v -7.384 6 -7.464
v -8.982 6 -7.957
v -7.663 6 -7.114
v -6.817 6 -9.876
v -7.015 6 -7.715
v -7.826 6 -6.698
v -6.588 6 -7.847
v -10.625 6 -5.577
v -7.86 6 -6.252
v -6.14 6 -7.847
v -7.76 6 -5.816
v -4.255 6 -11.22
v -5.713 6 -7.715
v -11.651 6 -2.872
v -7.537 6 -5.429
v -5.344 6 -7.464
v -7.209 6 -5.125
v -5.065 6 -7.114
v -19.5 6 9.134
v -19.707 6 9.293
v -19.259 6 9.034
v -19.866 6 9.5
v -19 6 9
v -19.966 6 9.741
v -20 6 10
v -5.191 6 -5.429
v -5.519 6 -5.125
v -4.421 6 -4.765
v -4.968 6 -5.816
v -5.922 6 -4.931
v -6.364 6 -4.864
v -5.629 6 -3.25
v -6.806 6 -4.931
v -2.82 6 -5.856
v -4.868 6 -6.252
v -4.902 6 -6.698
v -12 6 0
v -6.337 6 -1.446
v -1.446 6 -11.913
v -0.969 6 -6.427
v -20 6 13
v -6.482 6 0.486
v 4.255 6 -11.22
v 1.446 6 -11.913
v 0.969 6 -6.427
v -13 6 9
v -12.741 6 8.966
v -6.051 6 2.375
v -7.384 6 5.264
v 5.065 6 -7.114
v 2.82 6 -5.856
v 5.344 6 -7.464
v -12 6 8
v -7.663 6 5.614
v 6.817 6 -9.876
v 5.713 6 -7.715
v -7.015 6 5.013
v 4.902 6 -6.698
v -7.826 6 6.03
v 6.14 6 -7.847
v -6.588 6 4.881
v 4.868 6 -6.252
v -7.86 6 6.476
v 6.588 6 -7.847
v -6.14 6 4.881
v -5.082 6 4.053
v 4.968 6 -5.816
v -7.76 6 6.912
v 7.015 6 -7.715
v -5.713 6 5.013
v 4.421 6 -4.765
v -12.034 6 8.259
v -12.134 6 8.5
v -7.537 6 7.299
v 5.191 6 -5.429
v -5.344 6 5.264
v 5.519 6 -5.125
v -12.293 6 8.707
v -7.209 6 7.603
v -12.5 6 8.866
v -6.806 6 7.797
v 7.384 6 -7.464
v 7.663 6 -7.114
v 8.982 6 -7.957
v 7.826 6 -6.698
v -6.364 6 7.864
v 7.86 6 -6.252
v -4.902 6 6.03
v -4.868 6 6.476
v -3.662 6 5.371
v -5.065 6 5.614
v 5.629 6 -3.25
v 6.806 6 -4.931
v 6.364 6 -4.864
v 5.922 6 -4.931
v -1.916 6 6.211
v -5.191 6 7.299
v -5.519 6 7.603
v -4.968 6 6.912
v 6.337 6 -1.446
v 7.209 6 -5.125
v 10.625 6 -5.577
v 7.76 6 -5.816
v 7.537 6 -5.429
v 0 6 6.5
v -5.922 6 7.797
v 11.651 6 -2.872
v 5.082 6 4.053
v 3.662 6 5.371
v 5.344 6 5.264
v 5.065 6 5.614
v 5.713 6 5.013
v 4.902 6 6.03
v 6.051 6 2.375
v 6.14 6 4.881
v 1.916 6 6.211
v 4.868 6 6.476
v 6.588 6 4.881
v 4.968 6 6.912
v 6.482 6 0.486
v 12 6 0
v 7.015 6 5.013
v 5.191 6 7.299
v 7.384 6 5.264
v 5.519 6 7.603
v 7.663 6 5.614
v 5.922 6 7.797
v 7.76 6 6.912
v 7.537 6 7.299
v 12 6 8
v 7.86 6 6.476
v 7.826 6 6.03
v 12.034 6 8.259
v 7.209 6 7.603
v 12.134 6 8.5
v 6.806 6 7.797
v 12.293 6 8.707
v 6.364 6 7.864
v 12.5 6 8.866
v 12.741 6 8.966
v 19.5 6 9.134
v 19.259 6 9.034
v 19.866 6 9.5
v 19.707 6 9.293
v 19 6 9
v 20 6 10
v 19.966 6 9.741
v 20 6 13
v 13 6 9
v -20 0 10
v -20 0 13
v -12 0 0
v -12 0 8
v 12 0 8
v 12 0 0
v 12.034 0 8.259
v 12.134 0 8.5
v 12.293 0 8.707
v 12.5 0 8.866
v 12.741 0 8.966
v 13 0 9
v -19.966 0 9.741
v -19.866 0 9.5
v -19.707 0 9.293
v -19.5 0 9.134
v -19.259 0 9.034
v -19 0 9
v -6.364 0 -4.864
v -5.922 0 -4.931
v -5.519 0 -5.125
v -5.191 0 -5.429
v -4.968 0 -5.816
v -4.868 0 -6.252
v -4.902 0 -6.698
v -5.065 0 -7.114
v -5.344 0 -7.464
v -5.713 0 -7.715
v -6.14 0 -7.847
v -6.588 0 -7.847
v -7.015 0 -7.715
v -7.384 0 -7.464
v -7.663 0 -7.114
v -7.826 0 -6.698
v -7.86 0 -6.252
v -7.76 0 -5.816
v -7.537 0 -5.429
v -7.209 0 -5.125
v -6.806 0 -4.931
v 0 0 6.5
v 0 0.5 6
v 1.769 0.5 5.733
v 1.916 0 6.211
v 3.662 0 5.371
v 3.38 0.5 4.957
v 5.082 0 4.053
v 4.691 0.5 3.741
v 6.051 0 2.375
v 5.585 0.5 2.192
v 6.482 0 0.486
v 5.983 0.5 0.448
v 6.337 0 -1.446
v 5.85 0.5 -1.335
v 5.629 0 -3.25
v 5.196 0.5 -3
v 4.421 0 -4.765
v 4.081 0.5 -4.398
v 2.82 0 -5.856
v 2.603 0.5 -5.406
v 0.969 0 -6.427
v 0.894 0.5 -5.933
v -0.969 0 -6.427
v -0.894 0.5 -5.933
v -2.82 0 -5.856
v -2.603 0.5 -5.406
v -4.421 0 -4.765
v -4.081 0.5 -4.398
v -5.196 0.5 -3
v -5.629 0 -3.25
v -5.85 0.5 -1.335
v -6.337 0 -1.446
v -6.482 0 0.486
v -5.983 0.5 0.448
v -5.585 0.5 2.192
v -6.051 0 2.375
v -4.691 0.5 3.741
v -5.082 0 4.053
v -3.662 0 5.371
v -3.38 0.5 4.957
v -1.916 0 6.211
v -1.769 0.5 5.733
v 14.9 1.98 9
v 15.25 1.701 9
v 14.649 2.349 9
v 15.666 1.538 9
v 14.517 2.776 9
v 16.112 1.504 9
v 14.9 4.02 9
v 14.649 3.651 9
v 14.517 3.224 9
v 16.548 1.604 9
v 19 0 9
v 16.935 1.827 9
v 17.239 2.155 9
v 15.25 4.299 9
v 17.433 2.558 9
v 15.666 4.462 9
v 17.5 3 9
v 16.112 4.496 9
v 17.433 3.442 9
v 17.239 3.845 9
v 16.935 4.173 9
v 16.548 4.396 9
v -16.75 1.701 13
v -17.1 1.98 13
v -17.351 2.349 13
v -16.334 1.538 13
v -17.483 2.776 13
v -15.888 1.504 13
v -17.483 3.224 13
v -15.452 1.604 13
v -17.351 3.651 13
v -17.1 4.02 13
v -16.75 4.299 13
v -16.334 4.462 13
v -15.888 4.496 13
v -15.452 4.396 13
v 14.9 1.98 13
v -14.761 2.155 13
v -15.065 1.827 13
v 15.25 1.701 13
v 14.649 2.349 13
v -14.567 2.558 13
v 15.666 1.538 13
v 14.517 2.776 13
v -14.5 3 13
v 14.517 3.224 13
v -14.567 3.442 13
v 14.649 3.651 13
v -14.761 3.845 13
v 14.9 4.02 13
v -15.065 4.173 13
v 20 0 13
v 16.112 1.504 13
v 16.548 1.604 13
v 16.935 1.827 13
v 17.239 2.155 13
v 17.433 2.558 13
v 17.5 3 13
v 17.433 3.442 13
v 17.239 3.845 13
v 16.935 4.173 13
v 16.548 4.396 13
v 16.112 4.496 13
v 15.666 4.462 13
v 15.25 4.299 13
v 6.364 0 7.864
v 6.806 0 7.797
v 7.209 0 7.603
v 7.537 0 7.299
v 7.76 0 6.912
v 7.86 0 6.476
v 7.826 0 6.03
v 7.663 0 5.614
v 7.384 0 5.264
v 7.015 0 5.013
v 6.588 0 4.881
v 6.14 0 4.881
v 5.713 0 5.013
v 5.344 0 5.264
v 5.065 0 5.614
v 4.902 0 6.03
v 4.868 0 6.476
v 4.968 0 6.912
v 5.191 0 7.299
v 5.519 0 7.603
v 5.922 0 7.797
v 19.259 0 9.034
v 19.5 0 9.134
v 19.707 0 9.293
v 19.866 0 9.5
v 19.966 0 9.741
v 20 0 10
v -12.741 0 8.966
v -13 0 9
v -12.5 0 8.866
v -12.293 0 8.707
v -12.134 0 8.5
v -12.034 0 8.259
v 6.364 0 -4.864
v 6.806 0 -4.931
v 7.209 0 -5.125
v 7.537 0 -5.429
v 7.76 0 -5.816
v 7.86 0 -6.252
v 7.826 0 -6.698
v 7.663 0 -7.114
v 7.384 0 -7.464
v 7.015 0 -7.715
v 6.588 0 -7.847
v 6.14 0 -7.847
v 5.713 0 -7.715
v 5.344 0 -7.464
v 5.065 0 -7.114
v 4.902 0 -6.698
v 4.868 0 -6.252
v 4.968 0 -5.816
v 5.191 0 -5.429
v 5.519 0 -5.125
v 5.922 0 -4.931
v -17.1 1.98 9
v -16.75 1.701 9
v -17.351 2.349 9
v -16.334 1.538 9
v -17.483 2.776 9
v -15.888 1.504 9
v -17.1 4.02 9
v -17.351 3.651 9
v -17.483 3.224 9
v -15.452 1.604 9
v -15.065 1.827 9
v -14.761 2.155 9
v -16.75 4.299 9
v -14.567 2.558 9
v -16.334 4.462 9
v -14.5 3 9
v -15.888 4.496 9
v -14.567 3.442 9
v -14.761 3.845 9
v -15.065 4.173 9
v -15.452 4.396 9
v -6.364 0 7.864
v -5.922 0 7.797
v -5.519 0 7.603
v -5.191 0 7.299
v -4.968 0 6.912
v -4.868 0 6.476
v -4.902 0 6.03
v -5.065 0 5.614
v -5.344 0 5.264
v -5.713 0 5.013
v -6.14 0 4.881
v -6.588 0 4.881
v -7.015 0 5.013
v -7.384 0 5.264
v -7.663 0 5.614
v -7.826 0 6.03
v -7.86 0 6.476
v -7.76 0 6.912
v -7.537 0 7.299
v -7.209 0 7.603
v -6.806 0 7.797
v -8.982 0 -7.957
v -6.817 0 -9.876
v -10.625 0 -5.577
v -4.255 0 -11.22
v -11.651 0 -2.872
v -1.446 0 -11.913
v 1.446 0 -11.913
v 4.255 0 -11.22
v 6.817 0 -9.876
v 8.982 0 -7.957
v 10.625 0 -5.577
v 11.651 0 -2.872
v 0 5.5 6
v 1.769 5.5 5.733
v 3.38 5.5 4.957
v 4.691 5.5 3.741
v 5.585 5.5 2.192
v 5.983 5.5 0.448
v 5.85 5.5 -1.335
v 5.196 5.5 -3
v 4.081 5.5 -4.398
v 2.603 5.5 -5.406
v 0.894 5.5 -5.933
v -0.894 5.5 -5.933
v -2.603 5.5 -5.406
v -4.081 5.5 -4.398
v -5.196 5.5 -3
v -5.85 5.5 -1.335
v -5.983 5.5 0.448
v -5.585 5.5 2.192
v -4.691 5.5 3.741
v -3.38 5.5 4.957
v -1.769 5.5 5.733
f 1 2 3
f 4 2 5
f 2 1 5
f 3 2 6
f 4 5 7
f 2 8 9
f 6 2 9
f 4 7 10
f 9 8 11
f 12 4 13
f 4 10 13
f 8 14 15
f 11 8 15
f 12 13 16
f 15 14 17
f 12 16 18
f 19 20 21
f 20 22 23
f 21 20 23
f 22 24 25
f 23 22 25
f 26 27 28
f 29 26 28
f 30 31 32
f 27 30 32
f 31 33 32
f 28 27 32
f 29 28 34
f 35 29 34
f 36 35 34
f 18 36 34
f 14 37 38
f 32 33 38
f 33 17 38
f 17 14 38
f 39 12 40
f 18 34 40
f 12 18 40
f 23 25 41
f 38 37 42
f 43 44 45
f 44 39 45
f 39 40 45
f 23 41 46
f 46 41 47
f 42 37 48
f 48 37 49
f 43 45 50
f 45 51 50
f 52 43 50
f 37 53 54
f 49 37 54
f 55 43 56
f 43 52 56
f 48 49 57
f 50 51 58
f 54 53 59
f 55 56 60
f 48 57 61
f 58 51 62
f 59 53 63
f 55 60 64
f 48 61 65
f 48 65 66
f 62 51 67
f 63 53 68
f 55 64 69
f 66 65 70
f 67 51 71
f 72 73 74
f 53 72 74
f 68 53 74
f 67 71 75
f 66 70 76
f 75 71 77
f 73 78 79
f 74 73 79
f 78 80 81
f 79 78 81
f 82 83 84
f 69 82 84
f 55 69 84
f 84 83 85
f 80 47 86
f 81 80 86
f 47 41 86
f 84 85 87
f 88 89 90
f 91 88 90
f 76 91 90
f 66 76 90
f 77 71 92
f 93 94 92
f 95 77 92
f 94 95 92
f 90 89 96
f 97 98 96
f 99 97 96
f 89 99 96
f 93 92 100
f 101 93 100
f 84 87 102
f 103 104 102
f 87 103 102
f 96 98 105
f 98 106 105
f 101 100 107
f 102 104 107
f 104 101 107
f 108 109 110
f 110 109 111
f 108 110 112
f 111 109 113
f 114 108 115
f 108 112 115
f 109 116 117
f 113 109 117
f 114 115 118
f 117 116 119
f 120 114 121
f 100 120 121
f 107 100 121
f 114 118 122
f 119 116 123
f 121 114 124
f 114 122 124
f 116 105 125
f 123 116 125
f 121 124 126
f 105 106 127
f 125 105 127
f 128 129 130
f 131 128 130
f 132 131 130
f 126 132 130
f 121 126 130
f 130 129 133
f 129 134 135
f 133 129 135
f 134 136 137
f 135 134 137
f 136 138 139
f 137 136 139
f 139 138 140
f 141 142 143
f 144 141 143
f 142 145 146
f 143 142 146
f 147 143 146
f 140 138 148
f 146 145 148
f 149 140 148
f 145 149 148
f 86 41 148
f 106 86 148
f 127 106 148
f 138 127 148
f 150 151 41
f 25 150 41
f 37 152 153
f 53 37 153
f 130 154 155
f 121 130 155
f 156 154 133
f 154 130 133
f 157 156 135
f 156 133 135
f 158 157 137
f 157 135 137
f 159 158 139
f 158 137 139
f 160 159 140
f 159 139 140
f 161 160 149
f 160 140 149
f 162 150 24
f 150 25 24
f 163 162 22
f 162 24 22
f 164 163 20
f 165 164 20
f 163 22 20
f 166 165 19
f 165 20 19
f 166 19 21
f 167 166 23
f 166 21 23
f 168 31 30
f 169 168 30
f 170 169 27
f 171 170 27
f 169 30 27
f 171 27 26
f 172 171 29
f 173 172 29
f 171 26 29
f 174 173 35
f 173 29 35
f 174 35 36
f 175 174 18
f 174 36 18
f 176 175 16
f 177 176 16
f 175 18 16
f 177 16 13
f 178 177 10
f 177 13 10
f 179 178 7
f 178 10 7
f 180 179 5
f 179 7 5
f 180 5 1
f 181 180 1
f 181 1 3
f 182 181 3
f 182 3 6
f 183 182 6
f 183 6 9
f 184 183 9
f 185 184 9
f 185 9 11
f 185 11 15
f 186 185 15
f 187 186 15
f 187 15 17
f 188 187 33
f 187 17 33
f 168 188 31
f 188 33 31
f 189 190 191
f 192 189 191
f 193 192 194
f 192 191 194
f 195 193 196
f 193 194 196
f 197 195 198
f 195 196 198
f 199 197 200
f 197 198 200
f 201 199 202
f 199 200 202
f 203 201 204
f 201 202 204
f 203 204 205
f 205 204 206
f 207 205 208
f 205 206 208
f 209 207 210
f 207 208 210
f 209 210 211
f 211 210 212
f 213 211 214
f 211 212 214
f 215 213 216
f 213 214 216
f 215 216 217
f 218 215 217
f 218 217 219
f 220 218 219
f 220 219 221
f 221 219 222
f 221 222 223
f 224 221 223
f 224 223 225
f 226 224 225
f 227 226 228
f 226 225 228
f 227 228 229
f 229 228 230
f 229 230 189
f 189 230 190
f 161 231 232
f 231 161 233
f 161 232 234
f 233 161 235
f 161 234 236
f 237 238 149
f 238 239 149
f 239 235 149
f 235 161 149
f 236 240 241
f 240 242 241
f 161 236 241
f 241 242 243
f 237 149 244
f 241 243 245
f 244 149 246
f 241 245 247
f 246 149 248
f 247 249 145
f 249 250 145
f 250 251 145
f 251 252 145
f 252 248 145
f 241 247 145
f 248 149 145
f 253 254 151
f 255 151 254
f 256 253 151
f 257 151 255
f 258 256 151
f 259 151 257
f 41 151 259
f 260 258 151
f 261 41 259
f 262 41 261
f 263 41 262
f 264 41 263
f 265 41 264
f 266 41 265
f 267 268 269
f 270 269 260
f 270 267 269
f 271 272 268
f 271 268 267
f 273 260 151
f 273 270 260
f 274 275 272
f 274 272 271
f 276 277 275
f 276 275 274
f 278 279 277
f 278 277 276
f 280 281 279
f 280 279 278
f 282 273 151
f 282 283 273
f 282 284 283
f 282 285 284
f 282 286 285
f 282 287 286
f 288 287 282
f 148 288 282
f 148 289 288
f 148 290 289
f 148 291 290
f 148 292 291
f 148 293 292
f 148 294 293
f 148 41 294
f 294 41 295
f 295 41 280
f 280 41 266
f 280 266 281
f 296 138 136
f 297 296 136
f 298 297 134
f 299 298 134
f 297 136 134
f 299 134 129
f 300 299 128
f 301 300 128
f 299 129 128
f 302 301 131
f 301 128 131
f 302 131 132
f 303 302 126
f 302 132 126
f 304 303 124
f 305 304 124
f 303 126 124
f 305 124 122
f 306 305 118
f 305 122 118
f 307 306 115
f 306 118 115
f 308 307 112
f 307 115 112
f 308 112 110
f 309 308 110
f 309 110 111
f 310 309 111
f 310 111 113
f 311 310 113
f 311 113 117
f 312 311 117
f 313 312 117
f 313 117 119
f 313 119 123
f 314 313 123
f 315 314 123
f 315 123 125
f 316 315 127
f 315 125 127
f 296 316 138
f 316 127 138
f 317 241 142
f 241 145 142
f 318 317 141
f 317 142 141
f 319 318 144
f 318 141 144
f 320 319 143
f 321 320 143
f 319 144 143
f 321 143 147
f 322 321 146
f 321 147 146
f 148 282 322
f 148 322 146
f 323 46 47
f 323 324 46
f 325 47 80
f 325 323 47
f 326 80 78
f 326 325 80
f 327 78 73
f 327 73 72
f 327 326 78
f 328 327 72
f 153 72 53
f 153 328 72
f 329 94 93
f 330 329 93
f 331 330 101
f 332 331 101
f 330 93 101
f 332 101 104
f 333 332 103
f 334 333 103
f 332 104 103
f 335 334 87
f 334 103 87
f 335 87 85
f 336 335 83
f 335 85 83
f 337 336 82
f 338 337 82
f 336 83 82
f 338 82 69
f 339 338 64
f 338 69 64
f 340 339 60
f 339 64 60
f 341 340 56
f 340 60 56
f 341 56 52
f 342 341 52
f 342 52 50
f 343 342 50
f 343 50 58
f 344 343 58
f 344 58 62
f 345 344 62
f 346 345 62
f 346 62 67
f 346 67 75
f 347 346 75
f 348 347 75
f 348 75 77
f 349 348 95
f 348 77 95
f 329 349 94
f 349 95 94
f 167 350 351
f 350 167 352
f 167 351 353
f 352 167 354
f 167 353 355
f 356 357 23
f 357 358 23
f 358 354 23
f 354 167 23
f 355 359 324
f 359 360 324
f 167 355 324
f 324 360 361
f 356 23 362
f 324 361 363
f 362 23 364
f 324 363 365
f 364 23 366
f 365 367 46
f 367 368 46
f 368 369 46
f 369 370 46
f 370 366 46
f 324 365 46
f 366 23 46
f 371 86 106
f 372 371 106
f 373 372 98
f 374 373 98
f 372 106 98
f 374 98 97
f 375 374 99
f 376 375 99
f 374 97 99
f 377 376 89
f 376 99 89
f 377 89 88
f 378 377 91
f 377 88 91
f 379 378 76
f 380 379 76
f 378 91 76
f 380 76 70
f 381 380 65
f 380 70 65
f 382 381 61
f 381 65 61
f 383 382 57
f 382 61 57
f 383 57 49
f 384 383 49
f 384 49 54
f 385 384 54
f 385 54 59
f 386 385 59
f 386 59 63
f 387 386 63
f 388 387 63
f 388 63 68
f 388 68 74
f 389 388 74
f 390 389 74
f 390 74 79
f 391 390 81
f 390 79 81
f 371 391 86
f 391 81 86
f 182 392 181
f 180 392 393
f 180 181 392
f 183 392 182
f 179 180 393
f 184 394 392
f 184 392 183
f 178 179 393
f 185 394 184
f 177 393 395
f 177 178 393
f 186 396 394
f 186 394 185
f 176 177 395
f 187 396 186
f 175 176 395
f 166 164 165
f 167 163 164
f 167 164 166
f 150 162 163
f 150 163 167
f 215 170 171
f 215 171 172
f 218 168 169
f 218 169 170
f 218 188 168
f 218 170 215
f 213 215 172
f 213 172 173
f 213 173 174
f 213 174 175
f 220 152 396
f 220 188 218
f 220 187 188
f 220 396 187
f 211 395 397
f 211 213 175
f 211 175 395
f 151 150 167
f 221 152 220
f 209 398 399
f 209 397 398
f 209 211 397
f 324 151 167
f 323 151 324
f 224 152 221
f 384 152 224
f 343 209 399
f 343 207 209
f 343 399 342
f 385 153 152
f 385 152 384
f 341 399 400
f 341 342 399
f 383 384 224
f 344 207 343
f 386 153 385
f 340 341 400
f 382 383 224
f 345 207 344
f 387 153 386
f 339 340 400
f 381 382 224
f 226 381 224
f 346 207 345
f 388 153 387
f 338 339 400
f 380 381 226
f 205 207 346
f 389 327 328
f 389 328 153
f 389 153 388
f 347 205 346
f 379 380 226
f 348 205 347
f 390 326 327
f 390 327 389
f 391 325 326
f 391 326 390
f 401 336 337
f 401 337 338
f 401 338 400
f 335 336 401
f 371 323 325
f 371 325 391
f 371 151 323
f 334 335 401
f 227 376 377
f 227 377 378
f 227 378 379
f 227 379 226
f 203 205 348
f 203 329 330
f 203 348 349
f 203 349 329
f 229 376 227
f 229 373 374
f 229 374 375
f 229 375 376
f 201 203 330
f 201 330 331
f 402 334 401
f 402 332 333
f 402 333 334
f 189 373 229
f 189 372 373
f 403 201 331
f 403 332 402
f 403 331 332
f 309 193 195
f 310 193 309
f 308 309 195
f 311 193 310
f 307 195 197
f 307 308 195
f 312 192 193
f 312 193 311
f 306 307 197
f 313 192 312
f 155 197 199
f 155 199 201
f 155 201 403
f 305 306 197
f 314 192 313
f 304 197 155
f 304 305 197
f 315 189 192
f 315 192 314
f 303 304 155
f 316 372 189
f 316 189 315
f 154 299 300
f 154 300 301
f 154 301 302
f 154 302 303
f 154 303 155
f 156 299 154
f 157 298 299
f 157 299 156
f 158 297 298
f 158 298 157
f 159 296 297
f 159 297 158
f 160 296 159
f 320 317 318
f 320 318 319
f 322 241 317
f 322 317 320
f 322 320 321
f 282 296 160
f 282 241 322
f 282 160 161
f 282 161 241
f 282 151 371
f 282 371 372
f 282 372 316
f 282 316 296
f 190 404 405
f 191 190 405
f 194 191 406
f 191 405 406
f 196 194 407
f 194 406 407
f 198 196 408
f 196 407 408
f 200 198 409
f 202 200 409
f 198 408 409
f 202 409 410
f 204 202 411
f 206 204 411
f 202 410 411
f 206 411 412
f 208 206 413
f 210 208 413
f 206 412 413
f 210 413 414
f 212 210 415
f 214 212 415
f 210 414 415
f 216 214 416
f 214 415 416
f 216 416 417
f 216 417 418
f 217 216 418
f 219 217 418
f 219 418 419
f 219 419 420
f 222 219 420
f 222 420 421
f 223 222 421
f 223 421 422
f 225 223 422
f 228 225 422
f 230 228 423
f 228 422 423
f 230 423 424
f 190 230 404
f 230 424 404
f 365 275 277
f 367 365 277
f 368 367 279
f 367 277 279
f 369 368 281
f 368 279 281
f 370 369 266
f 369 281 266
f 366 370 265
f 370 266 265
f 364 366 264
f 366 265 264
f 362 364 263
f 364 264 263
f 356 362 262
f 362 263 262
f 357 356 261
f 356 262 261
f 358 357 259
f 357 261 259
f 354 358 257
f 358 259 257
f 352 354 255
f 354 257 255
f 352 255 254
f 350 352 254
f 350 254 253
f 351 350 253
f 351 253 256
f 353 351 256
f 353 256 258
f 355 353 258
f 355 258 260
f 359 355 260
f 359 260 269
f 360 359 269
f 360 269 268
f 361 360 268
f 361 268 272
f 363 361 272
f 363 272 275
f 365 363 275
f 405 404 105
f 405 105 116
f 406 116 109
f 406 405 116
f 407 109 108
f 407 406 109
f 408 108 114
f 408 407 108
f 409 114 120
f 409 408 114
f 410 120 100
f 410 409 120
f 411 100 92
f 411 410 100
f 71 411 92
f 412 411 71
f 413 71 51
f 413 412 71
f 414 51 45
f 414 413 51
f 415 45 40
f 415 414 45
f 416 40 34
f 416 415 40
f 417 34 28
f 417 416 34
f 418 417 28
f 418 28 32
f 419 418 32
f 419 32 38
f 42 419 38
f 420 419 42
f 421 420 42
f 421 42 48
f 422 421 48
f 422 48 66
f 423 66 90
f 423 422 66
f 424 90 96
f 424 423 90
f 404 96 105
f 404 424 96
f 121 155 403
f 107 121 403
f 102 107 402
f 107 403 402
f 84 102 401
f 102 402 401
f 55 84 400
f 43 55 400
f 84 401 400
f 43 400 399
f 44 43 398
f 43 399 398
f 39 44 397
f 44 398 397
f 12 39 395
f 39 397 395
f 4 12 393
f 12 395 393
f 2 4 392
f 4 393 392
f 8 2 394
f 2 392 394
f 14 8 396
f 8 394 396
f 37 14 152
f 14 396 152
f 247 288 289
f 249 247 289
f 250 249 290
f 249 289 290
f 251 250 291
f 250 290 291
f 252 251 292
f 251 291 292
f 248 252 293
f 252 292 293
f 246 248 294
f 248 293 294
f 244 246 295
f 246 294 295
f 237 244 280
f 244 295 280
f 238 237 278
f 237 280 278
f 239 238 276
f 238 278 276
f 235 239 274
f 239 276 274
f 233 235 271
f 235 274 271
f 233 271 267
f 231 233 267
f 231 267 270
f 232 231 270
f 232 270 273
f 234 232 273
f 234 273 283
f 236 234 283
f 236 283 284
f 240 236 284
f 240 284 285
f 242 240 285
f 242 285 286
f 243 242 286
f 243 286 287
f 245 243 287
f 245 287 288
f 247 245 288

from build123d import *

# Parameters (mm, degrees)
EXTRUDE_1_DEPTH     = 6
SKETCH_2_R          = 6
CUT_EXTRUDE_1_DEPTH = 6
SKETCH_3_R          = 1.5
CUT_EXTRUDE_2_DEPTH = 6
SKETCH_9_W          = 40
SKETCH_9_H          = 6
EXTRUDE_4_DEPTH     = 4
SKETCH_10_R         = 1.5
CUT_EXTRUDE_4_DEPTH = 5
FILLET_2_R          = 1
CHAMFER_1_SIZE      = 0.5


with BuildPart() as part:
    # 草图1 → 凸台-拉伸1 (new body)
    with BuildSketch(Plane(origin=(0, 0, 0), x_dir=(1, 0, 0), z_dir=(0, 1, 0))):
        with BuildLine():
            Line((-12, 0), (-12, -13))
            Line((-12, -13), (12, -13))
            Line((12, -13), (12, 0))
            ThreePointArc((12, 0), (0, 12), (-12, 0))
        make_face()
    extrude(amount=EXTRUDE_1_DEPTH)

    # 草图2 → 切除-拉伸1 (cut)
    with BuildSketch(Plane(origin=(0, 6, 0), x_dir=(1, 0, 0), z_dir=(0, 1, 0))):
        with Locations(Location((0, 0, 0), (0, 0, 270))):
            Circle(SKETCH_2_R)
    extrude(amount=-CUT_EXTRUDE_1_DEPTH, mode=Mode.SUBTRACT)

    # 草图3 → 切除-拉伸2 (cut)
    with BuildSketch(Plane(origin=(0, 6, 0), x_dir=(1, 0, 0), z_dir=(0, 1, 0))):
        with Locations(Location((-6.363961031, 6.363961031, 0), (0, 0, 270))):
            Circle(SKETCH_3_R)
        with Locations(Location((6.363961031, 6.363961031, 0), (0, 0, 270))):
            Circle(SKETCH_3_R)
        with Locations(Location((6.363961031, -6.363961031, 0), (0, 0, 270))):
            Circle(SKETCH_3_R)
        with Locations(Location((-6.363961031, -6.363961031, 0), (0, 0, 270))):
            Circle(SKETCH_3_R)
    extrude(amount=-CUT_EXTRUDE_2_DEPTH, mode=Mode.SUBTRACT)

    # 草图9 → 凸台-拉伸4 (add)
    with BuildSketch(Plane.XY.offset(13)):
        with Locations((0, 3)):
            Rectangle(SKETCH_9_W, SKETCH_9_H)
    extrude(amount=-EXTRUDE_4_DEPTH)

    # 草图10 → 切除-拉伸4 (cut)
    with BuildSketch(Plane.XY.offset(13)):
        with Locations((-16, 3)):
            Circle(SKETCH_10_R)
        with Locations((16, 3)):
            Circle(SKETCH_10_R)
    extrude(amount=-CUT_EXTRUDE_4_DEPTH, mode=Mode.SUBTRACT)

    # 圆角2
    fillet_2_edges = [part.edges().sort_by_distance(p)[0] for p in [
        (-12, 3, 9),
        (12, 3, 9),
        (-20, 3, 9),
        (20, 3, 9),
    ]]
    fillet(fillet_2_edges, radius=FILLET_2_R)

    # 倒角1
    chamfer_1_edges = [part.edges().sort_by_distance(p)[0] for p in [
        (0, 0, -6),
        (0, 6, -6),
    ]]
    chamfer(chamfer_1_edges, length=CHAMFER_1_SIZE)


solid = part.part
